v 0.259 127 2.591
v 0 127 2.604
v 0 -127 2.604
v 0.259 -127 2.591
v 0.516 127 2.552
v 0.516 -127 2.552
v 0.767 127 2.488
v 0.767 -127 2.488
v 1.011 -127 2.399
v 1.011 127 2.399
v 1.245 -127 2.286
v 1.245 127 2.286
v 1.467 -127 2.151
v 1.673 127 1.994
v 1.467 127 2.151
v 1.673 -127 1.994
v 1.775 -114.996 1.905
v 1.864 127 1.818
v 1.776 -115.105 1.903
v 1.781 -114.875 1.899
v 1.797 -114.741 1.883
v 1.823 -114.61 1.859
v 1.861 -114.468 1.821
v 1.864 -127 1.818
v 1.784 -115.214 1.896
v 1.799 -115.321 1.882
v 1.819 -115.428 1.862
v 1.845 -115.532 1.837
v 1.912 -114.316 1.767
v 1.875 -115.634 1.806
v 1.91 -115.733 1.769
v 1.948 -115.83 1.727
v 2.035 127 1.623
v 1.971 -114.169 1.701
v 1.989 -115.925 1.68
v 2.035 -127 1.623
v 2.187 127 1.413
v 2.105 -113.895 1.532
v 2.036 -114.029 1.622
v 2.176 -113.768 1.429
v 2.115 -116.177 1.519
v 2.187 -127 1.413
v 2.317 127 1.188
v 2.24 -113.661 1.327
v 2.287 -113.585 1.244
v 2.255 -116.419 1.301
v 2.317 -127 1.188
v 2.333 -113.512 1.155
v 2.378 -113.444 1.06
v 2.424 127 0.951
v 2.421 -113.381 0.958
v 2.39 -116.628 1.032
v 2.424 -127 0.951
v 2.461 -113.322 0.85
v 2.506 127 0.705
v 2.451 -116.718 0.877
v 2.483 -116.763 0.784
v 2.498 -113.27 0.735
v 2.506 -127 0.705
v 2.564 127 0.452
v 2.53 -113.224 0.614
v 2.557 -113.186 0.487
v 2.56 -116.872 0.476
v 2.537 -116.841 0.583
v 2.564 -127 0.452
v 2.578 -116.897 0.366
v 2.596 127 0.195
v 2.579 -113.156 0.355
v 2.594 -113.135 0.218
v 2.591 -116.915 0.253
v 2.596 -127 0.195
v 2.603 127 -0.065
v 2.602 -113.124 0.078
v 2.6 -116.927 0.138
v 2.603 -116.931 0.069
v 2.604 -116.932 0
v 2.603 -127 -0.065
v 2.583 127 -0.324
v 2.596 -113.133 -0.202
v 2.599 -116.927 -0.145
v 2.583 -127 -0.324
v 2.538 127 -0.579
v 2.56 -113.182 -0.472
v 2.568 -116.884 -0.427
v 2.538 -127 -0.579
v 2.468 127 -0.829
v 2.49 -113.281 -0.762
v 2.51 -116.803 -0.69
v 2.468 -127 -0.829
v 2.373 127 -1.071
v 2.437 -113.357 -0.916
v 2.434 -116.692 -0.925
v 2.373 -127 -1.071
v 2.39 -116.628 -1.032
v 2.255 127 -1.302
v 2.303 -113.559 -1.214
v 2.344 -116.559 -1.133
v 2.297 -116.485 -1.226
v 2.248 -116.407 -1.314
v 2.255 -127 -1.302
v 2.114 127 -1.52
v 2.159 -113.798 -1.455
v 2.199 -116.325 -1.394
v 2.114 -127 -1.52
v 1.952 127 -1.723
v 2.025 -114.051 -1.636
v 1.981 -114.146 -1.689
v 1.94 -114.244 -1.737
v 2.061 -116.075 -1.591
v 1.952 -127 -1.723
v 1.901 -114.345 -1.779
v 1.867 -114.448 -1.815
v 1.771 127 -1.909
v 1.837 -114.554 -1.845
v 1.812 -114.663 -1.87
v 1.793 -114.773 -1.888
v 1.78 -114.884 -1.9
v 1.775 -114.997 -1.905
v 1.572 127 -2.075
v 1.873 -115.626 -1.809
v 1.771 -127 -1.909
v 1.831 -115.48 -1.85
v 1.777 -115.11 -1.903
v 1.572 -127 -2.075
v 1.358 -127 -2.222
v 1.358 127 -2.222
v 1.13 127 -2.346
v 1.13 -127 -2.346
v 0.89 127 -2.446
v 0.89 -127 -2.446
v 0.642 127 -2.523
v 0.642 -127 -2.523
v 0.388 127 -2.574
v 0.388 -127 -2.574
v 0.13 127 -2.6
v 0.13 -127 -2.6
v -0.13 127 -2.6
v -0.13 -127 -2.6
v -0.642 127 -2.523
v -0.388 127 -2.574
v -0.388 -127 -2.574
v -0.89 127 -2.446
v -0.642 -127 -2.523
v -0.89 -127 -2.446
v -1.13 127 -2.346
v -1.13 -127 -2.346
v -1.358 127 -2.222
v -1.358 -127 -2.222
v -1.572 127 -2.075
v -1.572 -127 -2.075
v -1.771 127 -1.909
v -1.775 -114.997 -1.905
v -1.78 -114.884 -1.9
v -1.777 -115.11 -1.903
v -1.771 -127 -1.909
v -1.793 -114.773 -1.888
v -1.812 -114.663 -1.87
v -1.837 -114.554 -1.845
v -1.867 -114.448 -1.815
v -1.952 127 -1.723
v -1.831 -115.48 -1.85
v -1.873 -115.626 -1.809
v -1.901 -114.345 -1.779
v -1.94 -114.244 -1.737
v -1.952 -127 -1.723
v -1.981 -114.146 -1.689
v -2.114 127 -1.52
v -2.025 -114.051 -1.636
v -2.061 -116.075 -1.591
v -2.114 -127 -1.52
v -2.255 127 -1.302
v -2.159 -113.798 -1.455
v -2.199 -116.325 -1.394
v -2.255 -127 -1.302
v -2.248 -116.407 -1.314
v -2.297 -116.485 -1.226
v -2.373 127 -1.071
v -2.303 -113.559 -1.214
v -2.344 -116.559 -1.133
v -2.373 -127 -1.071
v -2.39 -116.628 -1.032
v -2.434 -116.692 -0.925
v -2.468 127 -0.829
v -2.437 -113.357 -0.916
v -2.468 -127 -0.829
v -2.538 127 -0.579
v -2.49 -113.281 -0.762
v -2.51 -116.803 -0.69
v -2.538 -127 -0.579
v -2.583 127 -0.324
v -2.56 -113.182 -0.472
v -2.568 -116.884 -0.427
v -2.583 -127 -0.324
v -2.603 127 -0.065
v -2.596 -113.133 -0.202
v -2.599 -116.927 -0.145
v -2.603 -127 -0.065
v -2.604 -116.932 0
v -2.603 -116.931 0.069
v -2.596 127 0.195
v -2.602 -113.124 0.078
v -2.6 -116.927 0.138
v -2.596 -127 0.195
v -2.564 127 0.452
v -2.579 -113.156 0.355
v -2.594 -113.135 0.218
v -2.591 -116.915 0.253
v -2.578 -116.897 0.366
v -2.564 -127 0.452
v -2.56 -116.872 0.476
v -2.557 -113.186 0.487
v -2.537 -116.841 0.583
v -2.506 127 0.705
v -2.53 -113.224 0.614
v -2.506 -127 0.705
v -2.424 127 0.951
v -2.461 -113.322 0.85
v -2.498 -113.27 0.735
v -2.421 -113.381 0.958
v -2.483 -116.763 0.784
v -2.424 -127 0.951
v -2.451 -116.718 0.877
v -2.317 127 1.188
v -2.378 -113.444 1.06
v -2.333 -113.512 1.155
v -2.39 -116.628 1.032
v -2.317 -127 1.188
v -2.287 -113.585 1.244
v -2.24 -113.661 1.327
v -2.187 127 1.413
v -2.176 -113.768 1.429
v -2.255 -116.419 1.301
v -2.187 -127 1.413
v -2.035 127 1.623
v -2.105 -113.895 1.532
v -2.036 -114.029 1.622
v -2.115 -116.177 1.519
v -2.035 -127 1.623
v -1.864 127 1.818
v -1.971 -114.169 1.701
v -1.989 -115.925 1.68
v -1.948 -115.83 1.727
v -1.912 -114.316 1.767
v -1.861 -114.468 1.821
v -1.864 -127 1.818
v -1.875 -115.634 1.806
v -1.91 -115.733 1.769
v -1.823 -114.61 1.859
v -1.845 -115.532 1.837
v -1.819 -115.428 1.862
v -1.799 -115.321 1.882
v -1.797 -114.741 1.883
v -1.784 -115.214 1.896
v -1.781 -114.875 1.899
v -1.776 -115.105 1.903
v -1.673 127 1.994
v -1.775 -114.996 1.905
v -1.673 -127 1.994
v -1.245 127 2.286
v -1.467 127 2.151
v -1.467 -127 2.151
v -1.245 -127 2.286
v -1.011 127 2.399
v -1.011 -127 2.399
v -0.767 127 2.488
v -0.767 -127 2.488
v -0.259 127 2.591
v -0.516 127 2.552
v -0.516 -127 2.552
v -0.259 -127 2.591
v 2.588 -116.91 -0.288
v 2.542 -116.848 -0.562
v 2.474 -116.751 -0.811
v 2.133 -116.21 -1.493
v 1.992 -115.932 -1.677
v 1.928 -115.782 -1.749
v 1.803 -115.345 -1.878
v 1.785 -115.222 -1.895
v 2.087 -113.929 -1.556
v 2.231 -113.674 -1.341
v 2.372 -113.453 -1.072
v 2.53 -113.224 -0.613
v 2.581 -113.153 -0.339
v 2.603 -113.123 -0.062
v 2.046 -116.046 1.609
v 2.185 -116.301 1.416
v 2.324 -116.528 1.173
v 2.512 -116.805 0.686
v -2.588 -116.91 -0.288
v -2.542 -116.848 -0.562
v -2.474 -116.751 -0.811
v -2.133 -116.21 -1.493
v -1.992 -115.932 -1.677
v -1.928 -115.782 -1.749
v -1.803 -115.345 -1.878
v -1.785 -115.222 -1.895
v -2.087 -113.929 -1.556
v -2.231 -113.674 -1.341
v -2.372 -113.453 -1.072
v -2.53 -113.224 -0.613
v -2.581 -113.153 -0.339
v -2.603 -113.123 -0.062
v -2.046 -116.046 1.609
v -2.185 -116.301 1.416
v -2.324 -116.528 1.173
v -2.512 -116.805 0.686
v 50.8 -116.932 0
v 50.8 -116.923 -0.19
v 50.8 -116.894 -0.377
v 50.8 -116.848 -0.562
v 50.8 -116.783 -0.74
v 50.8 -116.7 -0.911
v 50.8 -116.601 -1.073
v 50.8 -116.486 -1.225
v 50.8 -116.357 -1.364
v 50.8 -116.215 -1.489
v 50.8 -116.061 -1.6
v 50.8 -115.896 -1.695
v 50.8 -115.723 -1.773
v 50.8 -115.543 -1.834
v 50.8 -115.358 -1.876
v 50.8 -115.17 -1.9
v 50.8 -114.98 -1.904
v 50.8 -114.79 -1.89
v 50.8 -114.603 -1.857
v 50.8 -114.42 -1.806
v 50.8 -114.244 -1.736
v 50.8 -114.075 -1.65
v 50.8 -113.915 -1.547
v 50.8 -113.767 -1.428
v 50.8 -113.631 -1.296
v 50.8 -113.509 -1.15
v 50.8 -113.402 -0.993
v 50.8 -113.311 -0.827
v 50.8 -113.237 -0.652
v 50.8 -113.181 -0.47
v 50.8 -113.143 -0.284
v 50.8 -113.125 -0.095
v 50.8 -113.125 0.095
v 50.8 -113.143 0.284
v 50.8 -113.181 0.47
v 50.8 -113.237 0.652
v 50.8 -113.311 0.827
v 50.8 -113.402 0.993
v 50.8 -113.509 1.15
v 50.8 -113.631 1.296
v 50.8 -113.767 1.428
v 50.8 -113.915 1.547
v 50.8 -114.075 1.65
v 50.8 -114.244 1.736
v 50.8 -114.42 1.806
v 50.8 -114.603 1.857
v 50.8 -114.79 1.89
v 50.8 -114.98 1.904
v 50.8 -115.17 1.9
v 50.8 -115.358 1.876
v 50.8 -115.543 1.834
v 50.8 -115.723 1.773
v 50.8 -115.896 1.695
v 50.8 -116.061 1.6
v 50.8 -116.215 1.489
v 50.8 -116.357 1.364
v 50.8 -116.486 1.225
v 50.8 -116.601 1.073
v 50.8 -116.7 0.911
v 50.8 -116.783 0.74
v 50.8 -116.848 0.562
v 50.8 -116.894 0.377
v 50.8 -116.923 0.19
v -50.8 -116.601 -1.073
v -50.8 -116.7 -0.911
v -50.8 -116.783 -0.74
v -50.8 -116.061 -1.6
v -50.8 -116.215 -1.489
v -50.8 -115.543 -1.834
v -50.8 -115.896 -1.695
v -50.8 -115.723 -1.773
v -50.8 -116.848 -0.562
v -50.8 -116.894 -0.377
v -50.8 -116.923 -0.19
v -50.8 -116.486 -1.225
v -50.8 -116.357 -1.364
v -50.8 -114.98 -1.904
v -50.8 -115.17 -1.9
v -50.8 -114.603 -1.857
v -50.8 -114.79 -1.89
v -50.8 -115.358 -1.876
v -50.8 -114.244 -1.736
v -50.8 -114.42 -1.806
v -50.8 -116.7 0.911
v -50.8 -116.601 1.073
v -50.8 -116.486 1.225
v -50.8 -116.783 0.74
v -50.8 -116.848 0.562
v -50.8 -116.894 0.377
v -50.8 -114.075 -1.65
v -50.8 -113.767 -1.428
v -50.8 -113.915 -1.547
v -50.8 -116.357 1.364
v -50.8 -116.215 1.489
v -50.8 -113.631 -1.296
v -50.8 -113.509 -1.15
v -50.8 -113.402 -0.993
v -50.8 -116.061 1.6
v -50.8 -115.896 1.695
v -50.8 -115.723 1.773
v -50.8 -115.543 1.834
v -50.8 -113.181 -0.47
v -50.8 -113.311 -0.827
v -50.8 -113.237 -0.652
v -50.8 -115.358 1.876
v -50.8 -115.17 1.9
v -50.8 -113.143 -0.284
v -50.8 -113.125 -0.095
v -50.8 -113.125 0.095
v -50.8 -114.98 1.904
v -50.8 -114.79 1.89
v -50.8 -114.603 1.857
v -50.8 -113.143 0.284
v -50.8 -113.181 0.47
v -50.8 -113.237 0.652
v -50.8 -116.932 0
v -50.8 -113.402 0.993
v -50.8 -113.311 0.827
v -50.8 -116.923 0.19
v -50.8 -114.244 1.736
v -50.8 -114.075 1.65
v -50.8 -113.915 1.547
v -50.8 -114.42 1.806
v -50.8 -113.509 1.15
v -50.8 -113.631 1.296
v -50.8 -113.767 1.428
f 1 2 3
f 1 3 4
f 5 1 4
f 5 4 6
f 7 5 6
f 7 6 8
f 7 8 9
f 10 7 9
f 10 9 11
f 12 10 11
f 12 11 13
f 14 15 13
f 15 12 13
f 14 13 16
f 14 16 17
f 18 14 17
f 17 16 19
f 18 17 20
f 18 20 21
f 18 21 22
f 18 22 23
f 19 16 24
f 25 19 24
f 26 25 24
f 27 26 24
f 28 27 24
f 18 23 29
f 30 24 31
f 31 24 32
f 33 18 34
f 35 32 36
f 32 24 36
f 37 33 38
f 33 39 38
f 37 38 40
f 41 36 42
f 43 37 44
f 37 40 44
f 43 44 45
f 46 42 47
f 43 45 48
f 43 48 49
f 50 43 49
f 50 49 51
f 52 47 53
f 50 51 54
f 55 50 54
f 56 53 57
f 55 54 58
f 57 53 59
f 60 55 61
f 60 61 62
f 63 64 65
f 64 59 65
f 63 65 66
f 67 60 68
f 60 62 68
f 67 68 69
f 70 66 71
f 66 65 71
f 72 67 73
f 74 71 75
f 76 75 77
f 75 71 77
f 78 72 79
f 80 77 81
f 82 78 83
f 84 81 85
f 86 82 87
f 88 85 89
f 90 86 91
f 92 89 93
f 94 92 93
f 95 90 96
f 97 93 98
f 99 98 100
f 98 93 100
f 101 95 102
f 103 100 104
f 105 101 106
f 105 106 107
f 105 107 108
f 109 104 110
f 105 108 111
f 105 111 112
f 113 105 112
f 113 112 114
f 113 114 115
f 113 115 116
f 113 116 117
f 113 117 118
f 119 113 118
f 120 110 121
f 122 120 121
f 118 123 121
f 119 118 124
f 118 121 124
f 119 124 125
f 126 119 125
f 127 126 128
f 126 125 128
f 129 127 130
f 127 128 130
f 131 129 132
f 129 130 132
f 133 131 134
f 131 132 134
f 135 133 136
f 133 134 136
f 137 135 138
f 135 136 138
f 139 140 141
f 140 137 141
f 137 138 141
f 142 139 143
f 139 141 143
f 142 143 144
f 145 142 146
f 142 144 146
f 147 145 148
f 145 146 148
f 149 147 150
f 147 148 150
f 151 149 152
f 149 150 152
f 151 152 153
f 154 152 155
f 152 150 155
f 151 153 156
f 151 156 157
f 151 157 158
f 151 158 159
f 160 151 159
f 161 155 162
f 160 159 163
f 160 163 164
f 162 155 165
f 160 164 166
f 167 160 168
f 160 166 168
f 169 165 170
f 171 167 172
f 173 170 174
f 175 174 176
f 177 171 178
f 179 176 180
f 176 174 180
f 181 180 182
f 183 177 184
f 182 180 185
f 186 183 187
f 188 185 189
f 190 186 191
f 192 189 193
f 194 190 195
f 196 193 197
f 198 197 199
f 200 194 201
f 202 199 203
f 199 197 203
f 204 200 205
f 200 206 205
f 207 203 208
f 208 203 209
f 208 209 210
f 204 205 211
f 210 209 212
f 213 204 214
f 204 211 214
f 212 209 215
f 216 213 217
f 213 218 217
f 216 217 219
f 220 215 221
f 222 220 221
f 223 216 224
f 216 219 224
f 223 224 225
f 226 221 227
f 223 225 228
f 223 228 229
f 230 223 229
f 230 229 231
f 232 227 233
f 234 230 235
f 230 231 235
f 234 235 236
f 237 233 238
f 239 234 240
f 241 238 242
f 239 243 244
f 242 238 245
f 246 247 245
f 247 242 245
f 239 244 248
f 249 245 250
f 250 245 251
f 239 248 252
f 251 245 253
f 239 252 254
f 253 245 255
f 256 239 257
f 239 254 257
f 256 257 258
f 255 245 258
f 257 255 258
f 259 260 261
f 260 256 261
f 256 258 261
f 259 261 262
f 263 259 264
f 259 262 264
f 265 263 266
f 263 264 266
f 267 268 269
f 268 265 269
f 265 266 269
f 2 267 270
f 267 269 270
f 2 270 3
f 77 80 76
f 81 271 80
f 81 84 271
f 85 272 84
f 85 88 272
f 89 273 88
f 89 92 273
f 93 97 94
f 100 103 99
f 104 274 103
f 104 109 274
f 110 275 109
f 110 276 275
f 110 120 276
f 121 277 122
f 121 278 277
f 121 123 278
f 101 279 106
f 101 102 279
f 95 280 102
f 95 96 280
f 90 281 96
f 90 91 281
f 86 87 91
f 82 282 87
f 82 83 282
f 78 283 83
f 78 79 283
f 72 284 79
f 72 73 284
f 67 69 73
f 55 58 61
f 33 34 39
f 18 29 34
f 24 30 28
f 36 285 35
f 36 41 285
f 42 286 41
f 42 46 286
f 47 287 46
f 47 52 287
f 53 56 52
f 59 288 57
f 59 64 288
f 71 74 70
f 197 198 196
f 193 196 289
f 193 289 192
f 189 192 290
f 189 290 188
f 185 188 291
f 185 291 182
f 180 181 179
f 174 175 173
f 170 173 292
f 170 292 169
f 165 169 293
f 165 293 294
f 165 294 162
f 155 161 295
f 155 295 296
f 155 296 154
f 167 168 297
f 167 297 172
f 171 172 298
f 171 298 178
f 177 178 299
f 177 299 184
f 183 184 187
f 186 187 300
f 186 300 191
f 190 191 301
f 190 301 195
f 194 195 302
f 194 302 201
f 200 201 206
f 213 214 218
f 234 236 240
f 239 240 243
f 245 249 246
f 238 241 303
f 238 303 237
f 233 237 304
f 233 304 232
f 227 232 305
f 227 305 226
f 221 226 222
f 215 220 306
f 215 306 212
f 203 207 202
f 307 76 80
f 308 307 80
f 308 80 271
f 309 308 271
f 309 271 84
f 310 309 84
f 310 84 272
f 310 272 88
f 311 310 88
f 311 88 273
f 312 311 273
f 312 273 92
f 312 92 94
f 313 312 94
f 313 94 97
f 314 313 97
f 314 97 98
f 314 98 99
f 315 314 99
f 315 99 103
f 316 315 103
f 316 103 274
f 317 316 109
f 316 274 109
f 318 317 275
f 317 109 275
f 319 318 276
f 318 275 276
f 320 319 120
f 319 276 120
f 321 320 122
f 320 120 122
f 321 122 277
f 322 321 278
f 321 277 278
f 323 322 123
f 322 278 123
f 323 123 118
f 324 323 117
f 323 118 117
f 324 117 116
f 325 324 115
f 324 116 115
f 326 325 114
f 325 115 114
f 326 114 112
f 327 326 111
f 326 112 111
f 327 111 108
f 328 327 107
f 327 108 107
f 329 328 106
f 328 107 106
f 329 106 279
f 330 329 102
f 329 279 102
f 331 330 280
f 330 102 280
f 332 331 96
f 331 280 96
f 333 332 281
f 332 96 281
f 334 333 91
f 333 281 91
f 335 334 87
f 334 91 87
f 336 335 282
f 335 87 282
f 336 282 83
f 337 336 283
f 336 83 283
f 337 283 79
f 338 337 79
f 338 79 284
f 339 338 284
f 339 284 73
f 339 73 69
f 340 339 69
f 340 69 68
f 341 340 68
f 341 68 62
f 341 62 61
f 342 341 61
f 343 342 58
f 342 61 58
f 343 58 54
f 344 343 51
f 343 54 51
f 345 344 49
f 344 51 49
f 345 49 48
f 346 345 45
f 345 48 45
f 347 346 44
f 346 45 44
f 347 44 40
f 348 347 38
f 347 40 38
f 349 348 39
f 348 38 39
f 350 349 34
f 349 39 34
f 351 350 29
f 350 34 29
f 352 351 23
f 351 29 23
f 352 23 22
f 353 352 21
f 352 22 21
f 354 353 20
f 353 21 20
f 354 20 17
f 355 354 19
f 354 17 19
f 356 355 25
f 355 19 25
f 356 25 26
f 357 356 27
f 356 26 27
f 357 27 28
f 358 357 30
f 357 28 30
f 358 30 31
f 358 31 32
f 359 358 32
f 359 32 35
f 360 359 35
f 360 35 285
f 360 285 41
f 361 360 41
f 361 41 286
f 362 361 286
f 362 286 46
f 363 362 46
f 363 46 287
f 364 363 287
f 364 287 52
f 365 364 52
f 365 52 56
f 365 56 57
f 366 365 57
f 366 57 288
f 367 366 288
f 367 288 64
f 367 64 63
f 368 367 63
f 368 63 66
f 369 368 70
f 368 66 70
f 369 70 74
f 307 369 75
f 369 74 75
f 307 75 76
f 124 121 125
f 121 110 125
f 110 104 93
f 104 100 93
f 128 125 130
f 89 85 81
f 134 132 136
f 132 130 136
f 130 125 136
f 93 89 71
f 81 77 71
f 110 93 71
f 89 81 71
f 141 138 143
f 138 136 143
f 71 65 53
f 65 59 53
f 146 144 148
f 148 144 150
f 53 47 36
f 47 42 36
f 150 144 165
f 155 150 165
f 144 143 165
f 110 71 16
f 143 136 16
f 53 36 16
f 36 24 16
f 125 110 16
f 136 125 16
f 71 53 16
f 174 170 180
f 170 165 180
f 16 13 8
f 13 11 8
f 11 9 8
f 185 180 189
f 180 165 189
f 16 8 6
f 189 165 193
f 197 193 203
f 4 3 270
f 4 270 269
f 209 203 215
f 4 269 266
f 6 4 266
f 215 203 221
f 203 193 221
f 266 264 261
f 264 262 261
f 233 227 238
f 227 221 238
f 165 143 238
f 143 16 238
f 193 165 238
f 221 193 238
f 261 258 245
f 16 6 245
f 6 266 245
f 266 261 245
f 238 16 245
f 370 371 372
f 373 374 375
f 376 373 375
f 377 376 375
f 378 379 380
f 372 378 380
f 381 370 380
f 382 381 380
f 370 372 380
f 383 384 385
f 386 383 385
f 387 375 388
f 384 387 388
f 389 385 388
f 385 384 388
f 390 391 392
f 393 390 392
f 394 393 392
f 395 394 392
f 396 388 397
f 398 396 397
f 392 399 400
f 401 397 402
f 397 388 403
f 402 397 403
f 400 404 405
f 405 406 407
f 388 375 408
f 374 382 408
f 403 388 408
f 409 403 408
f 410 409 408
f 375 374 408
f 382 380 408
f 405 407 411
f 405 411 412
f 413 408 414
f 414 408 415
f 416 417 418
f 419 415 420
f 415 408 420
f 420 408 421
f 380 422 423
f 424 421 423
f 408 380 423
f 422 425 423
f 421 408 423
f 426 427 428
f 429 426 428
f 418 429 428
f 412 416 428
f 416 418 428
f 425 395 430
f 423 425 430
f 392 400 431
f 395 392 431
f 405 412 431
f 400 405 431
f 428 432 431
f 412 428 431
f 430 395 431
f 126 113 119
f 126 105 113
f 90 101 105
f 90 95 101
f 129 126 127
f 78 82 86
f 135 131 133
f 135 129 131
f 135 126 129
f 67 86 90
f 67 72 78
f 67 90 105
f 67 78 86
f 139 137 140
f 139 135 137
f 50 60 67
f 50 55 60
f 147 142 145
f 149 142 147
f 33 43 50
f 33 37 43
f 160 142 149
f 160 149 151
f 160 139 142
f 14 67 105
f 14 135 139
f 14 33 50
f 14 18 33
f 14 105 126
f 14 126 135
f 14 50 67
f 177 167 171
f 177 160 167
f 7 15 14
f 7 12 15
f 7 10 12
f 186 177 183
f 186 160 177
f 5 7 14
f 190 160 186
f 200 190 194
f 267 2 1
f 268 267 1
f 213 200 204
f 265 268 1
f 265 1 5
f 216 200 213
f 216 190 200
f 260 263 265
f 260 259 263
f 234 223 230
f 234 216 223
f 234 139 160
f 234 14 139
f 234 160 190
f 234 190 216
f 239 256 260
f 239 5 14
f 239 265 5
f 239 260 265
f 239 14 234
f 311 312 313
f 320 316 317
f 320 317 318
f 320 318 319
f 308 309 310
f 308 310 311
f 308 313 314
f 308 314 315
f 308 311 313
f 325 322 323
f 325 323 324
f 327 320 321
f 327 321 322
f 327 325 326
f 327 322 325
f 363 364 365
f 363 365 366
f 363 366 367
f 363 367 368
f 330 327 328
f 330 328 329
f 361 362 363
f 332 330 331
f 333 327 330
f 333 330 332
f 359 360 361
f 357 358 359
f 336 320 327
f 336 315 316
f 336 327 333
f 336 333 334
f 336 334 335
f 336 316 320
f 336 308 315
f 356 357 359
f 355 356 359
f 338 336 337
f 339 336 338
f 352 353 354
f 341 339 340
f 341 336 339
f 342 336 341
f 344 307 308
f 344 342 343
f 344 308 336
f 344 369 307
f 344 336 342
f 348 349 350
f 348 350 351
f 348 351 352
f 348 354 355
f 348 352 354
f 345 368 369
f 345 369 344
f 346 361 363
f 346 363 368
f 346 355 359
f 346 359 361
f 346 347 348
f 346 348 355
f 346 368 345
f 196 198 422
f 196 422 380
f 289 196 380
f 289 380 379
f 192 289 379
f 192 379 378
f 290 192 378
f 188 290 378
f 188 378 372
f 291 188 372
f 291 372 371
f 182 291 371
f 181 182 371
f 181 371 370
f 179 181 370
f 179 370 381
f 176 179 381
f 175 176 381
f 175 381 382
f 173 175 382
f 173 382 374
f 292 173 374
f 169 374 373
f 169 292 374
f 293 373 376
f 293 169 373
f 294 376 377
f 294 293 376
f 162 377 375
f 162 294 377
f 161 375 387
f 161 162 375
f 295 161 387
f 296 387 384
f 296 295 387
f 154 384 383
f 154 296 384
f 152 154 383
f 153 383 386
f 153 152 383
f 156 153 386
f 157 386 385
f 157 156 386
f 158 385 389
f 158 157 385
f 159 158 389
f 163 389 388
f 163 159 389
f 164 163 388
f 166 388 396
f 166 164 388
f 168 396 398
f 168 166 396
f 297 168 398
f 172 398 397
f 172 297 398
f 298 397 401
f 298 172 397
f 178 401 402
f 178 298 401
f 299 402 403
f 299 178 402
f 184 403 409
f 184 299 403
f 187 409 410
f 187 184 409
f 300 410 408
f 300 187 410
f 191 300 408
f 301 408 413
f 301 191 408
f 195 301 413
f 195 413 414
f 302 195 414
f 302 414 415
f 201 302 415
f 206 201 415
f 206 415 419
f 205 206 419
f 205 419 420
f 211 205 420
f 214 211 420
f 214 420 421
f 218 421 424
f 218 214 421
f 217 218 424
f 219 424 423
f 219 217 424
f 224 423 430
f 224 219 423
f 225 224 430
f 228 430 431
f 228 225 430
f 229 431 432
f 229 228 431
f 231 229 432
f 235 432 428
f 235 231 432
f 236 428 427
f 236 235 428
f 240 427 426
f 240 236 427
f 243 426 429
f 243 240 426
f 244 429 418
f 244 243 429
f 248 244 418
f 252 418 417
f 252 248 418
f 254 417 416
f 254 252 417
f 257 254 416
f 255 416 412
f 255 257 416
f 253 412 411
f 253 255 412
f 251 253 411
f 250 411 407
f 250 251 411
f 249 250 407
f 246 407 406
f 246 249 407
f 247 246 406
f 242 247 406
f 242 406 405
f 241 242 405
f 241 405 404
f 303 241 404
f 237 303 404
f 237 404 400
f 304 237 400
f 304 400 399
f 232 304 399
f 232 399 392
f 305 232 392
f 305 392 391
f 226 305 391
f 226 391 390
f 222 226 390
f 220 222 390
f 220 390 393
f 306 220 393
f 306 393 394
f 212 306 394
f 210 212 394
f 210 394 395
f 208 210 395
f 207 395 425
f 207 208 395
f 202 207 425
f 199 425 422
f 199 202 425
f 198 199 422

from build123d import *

# Parameters (mm, degrees)
F1_DEPTH      = 127
F1_DEPTH_BACK = 127
F4_DEPTH      = 50.8
F4_DEPTH_BACK = 50.8


with BuildPart() as f1:
    # F0 (on Front) → F1 (new body, two sides)
    with BuildSketch(Plane.XZ) as f1_sk:
        with BuildLine():
            Line((0, -2.6035), (0, 2.6035))
            ThreePointArc((0, 2.6035), (-2.6035, 0), (0, -2.6035))
        make_face()
    extrude(amount=F1_DEPTH)
    extrude(f1_sk.sketch, amount=-F1_DEPTH_BACK)

    # F3: F1 across plane


with BuildPart() as f1_1:
    add(f1.part)
    add(f1.part.mirror(Plane.YZ))

    # F2 (on face) → F4 (join, two sides)
    with BuildSketch(Plane.YZ) as f4_sk:
        with BuildLine():
            Line((-116.9321797776, 0), (-113.1221797776, 0))
            ThreePointArc((-113.1221797776, 0), (-115.0271797776, 1.905), (-116.9321797776, 0))
        make_face()
        with BuildLine():
            ThreePointArc((-116.9321797776, 0), (-115.0271797776, -1.905), (-113.1221797776, 0))
            Line((-113.1221797776, 0), (-116.9321797776, 0))
        make_face()
    extrude(amount=F4_DEPTH)
    extrude(f4_sk.sketch, amount=-F4_DEPTH_BACK)


solid = f1_1.part
